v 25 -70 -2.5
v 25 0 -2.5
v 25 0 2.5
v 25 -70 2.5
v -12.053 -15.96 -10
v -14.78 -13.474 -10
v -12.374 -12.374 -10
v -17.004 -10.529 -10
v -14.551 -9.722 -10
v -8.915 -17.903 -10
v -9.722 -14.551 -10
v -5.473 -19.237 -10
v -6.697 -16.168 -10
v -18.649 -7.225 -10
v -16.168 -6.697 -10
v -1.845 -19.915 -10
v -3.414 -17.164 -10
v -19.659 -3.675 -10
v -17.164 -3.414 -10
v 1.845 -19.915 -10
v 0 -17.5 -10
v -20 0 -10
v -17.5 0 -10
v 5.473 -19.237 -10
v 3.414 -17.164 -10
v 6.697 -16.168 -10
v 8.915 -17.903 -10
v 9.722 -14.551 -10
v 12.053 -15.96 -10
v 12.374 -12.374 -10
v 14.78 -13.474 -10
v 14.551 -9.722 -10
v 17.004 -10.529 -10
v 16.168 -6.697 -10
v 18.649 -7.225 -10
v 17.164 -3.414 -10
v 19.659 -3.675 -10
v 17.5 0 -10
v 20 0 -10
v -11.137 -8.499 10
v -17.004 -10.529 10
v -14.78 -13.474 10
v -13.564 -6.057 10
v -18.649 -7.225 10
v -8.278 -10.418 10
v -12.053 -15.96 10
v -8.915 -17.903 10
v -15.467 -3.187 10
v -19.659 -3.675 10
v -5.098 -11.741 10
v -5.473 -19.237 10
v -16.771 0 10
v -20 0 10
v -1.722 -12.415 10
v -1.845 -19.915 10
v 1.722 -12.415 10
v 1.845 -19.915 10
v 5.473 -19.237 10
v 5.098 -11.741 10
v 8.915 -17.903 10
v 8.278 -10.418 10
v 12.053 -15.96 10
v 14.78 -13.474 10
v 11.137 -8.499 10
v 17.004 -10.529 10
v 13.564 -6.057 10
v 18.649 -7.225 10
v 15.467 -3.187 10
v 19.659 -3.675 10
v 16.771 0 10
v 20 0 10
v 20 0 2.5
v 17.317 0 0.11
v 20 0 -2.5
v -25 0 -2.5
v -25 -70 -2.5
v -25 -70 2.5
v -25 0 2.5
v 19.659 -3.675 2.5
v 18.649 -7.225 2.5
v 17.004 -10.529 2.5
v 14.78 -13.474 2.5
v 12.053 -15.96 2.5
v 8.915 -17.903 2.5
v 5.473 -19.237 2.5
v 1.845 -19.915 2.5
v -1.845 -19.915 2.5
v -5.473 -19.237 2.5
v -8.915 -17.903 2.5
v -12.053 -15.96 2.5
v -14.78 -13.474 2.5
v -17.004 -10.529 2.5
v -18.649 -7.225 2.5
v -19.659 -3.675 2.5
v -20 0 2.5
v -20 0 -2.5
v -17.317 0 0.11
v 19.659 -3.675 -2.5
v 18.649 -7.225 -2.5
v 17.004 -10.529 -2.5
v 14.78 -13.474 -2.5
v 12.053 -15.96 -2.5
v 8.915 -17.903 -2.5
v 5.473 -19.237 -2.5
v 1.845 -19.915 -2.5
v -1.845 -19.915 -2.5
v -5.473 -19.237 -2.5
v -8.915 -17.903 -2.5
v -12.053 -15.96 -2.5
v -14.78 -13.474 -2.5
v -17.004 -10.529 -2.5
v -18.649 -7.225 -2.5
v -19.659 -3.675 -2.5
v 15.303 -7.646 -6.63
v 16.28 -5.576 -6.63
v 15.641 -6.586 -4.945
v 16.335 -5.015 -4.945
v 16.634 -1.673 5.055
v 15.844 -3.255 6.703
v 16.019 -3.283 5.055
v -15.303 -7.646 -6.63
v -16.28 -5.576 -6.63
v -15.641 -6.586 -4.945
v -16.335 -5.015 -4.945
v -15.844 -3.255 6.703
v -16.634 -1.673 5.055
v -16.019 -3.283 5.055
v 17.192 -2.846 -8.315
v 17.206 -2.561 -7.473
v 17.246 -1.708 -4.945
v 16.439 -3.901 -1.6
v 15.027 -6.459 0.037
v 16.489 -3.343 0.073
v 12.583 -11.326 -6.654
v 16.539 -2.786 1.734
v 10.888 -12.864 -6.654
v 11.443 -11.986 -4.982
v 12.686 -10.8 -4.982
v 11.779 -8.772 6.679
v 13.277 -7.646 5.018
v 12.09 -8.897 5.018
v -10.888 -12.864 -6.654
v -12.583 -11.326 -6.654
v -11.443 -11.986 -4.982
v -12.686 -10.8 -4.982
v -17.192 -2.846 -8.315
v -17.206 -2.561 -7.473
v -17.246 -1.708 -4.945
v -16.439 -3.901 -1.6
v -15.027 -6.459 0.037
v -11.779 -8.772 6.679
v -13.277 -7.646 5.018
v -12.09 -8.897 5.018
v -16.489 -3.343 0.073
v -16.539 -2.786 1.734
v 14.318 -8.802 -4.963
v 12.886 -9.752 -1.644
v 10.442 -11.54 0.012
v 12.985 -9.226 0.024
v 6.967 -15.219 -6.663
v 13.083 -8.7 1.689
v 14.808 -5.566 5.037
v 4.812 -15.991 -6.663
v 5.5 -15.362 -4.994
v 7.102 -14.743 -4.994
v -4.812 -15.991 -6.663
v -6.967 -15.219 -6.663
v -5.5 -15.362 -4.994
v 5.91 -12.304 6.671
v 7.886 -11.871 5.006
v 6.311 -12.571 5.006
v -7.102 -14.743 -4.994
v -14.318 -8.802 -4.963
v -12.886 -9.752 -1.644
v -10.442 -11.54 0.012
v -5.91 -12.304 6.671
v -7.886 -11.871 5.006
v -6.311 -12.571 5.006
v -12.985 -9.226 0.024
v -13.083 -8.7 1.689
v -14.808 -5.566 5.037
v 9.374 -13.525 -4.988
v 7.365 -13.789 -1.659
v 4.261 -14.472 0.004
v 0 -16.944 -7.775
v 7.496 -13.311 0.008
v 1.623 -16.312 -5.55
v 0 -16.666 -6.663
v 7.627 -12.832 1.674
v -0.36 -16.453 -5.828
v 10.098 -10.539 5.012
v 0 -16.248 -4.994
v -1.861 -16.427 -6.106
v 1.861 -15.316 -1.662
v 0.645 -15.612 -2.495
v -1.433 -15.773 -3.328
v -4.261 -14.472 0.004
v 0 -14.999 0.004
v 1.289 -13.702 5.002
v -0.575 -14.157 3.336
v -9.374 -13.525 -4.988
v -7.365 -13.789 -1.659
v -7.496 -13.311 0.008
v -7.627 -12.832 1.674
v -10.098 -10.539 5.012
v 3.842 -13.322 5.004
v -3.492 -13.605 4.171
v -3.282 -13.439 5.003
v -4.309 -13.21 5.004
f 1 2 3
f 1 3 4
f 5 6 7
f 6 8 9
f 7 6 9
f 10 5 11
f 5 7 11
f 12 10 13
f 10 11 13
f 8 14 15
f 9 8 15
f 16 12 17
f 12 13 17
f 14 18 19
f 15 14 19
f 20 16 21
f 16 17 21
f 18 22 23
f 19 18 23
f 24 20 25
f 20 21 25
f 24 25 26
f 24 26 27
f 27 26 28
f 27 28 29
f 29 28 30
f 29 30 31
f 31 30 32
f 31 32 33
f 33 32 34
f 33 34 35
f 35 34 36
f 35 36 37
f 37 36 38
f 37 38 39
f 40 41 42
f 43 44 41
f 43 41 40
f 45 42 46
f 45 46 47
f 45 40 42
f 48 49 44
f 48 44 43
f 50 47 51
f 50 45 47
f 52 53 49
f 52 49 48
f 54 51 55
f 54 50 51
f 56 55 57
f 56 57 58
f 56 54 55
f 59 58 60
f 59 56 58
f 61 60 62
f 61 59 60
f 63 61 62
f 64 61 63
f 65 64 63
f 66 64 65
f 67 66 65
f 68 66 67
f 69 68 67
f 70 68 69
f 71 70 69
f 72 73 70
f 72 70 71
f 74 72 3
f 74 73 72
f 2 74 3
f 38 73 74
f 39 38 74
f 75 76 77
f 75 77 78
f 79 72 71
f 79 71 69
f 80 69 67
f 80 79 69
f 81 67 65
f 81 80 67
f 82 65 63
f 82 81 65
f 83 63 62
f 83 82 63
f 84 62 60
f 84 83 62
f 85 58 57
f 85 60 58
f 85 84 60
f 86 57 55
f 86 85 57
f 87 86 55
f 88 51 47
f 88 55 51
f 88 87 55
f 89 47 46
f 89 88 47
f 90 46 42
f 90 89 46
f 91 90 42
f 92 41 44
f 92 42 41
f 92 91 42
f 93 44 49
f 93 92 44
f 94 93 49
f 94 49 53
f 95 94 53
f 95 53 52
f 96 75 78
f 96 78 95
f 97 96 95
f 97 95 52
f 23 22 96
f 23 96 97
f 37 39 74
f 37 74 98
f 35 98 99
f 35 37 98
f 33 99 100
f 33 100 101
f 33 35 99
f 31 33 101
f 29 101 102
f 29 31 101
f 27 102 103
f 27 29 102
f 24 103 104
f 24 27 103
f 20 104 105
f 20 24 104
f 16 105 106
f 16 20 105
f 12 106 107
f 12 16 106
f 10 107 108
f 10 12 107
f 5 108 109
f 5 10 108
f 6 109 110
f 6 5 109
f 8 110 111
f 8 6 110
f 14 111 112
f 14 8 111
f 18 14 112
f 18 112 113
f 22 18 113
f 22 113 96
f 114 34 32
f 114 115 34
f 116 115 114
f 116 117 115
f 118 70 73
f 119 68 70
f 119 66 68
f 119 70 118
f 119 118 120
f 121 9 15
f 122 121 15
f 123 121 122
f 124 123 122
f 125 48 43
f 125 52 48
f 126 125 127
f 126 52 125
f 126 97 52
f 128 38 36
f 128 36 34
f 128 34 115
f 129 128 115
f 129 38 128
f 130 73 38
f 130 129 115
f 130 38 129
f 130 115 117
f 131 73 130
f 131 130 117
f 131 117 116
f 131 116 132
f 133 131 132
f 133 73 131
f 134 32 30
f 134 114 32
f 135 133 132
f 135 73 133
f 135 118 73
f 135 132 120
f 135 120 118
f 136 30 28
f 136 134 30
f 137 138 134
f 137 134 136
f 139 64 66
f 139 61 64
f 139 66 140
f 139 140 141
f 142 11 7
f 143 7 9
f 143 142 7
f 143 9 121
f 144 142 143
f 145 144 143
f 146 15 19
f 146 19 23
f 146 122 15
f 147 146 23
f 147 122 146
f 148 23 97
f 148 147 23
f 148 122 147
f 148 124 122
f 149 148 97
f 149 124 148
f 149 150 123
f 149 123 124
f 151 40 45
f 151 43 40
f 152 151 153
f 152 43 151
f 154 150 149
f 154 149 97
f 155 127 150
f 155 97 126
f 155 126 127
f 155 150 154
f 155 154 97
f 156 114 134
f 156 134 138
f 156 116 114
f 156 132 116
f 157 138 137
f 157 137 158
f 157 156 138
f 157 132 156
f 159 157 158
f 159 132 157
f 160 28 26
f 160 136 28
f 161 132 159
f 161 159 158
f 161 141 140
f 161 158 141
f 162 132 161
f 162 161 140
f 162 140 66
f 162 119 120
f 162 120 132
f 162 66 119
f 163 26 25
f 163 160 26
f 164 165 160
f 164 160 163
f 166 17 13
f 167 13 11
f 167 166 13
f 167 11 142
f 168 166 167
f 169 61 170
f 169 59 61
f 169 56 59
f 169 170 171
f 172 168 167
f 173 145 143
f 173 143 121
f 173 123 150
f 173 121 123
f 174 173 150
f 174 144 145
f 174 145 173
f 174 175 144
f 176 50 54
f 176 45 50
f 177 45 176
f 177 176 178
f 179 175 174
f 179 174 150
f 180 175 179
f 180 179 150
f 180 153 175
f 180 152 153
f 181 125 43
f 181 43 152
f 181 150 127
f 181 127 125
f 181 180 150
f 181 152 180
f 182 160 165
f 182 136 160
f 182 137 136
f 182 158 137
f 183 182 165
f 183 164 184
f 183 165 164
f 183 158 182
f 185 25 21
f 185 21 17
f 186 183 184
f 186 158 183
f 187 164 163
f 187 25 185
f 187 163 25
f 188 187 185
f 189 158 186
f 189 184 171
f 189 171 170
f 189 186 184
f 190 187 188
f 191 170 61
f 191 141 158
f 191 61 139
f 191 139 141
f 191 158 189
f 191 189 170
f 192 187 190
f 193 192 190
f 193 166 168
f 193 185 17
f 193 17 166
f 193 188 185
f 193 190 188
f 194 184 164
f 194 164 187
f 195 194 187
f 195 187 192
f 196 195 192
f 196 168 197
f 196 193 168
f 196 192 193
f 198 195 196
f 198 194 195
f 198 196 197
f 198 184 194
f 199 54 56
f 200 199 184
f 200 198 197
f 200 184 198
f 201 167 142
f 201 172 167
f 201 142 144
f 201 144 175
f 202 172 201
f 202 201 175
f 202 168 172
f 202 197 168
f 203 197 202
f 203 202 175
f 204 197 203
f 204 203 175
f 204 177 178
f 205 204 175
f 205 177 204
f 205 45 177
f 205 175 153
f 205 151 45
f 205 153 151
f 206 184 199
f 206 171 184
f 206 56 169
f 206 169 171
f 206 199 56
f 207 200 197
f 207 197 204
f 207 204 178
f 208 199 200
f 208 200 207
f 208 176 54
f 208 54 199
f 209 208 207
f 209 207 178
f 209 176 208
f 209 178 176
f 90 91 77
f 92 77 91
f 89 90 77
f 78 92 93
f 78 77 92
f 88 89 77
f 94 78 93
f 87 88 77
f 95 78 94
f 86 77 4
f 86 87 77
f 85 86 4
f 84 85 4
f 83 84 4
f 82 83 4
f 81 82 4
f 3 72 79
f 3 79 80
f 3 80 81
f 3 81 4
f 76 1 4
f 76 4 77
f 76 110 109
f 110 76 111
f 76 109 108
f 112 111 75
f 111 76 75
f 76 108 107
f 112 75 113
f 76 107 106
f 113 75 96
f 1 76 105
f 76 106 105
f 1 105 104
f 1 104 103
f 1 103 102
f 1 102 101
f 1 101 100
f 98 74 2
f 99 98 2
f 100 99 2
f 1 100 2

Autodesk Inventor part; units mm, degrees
ref_plane "YZ Plane" through (0, 0, 0) normal (1, 0, 0) x (0, 1, 0)
ref_plane "XZ Plane" through (0, 0, 0) normal (0, 1, 0) x (-1, 0, 0)
ref_plane "XY Plane" through (0, 0, 0) normal (0, 0, 1) x (1, 0, 0)
sketch "草圖1" plane through (0, 0, 0) normal (0, 0, 1) x (1, 0, 0)
  arc A0 (-17.5, 0) -> (17.5, 0) centre (0, 0) ccw
  arc A1 (-20, 0) -> (20, 0) centre (0, 0) ccw
  line L0 (-20, 0) -> (-17.5, 0)
  line L1 (20, 0) -> (17.5, 0)
  line L2 (-35, 0) -> (35, 0) projected
  line L3 (-25, 0) -> (25, 0)
  line L4 (25, -70) -> (-25, -70)
  line L5 (-25, -70) -> (-25, 0)
  line L6 (-25, 0) -> (25, 0)
  line L7 (25, 0) -> (25, -70)
  line L8 (25, -70) -> (-25, 0) construction
  line L9 (-25, -70) -> (25, 0) construction
  line L10 (0, -84) -> (0, 14) projected
  point P0 (17.5, 0)
  point P1 (20, 0)
  point P2 (20, 0)
  point P3 (0, -35)
  dimension "d0" = 17.5
  dimension "d16" = 50
  dimension "d17" = 70
  dimension "d22" = 20
extrude "擠出1" add sketch "草圖1" along normal mid plane 20 contours L2 L10 A0 | A0 L10 A1 L0 | L10 L2 A0 | A0 L1 A1 L10
extrude "擠出2" add sketch "草圖1" along normal mid plane 5
sketch "草圖2" plane through (0, 0, 0) normal (1, 0, 0) x (0, 1, 0)
  line L0 (-10, -10) -> (-5, 10)
  line L1 (0, -2.5) -> (0, -10) projected
  line L2 (0, 10) -> (0, 2.5) projected
  line L3 (-20, -10) -> (0, -10) projected
  line L4 (0, 10) -> (-20, 10) projected
  point P0 (0, 0)
  dimension "d18" = 10
  dimension "d19" = 5
sketch "草圖3" plane through (0, 0, -10) normal (0, 0, -1) x (-1, 0, 0)
  arc A0 (-17.5, 0) -> (17.5, 0) centre (0, 0) ccw projected
  line L0 (25, 0) -> (-25, 0) projected
sweep "掃掠1" cut profiles "草圖3" path "草圖2" path curves L0
